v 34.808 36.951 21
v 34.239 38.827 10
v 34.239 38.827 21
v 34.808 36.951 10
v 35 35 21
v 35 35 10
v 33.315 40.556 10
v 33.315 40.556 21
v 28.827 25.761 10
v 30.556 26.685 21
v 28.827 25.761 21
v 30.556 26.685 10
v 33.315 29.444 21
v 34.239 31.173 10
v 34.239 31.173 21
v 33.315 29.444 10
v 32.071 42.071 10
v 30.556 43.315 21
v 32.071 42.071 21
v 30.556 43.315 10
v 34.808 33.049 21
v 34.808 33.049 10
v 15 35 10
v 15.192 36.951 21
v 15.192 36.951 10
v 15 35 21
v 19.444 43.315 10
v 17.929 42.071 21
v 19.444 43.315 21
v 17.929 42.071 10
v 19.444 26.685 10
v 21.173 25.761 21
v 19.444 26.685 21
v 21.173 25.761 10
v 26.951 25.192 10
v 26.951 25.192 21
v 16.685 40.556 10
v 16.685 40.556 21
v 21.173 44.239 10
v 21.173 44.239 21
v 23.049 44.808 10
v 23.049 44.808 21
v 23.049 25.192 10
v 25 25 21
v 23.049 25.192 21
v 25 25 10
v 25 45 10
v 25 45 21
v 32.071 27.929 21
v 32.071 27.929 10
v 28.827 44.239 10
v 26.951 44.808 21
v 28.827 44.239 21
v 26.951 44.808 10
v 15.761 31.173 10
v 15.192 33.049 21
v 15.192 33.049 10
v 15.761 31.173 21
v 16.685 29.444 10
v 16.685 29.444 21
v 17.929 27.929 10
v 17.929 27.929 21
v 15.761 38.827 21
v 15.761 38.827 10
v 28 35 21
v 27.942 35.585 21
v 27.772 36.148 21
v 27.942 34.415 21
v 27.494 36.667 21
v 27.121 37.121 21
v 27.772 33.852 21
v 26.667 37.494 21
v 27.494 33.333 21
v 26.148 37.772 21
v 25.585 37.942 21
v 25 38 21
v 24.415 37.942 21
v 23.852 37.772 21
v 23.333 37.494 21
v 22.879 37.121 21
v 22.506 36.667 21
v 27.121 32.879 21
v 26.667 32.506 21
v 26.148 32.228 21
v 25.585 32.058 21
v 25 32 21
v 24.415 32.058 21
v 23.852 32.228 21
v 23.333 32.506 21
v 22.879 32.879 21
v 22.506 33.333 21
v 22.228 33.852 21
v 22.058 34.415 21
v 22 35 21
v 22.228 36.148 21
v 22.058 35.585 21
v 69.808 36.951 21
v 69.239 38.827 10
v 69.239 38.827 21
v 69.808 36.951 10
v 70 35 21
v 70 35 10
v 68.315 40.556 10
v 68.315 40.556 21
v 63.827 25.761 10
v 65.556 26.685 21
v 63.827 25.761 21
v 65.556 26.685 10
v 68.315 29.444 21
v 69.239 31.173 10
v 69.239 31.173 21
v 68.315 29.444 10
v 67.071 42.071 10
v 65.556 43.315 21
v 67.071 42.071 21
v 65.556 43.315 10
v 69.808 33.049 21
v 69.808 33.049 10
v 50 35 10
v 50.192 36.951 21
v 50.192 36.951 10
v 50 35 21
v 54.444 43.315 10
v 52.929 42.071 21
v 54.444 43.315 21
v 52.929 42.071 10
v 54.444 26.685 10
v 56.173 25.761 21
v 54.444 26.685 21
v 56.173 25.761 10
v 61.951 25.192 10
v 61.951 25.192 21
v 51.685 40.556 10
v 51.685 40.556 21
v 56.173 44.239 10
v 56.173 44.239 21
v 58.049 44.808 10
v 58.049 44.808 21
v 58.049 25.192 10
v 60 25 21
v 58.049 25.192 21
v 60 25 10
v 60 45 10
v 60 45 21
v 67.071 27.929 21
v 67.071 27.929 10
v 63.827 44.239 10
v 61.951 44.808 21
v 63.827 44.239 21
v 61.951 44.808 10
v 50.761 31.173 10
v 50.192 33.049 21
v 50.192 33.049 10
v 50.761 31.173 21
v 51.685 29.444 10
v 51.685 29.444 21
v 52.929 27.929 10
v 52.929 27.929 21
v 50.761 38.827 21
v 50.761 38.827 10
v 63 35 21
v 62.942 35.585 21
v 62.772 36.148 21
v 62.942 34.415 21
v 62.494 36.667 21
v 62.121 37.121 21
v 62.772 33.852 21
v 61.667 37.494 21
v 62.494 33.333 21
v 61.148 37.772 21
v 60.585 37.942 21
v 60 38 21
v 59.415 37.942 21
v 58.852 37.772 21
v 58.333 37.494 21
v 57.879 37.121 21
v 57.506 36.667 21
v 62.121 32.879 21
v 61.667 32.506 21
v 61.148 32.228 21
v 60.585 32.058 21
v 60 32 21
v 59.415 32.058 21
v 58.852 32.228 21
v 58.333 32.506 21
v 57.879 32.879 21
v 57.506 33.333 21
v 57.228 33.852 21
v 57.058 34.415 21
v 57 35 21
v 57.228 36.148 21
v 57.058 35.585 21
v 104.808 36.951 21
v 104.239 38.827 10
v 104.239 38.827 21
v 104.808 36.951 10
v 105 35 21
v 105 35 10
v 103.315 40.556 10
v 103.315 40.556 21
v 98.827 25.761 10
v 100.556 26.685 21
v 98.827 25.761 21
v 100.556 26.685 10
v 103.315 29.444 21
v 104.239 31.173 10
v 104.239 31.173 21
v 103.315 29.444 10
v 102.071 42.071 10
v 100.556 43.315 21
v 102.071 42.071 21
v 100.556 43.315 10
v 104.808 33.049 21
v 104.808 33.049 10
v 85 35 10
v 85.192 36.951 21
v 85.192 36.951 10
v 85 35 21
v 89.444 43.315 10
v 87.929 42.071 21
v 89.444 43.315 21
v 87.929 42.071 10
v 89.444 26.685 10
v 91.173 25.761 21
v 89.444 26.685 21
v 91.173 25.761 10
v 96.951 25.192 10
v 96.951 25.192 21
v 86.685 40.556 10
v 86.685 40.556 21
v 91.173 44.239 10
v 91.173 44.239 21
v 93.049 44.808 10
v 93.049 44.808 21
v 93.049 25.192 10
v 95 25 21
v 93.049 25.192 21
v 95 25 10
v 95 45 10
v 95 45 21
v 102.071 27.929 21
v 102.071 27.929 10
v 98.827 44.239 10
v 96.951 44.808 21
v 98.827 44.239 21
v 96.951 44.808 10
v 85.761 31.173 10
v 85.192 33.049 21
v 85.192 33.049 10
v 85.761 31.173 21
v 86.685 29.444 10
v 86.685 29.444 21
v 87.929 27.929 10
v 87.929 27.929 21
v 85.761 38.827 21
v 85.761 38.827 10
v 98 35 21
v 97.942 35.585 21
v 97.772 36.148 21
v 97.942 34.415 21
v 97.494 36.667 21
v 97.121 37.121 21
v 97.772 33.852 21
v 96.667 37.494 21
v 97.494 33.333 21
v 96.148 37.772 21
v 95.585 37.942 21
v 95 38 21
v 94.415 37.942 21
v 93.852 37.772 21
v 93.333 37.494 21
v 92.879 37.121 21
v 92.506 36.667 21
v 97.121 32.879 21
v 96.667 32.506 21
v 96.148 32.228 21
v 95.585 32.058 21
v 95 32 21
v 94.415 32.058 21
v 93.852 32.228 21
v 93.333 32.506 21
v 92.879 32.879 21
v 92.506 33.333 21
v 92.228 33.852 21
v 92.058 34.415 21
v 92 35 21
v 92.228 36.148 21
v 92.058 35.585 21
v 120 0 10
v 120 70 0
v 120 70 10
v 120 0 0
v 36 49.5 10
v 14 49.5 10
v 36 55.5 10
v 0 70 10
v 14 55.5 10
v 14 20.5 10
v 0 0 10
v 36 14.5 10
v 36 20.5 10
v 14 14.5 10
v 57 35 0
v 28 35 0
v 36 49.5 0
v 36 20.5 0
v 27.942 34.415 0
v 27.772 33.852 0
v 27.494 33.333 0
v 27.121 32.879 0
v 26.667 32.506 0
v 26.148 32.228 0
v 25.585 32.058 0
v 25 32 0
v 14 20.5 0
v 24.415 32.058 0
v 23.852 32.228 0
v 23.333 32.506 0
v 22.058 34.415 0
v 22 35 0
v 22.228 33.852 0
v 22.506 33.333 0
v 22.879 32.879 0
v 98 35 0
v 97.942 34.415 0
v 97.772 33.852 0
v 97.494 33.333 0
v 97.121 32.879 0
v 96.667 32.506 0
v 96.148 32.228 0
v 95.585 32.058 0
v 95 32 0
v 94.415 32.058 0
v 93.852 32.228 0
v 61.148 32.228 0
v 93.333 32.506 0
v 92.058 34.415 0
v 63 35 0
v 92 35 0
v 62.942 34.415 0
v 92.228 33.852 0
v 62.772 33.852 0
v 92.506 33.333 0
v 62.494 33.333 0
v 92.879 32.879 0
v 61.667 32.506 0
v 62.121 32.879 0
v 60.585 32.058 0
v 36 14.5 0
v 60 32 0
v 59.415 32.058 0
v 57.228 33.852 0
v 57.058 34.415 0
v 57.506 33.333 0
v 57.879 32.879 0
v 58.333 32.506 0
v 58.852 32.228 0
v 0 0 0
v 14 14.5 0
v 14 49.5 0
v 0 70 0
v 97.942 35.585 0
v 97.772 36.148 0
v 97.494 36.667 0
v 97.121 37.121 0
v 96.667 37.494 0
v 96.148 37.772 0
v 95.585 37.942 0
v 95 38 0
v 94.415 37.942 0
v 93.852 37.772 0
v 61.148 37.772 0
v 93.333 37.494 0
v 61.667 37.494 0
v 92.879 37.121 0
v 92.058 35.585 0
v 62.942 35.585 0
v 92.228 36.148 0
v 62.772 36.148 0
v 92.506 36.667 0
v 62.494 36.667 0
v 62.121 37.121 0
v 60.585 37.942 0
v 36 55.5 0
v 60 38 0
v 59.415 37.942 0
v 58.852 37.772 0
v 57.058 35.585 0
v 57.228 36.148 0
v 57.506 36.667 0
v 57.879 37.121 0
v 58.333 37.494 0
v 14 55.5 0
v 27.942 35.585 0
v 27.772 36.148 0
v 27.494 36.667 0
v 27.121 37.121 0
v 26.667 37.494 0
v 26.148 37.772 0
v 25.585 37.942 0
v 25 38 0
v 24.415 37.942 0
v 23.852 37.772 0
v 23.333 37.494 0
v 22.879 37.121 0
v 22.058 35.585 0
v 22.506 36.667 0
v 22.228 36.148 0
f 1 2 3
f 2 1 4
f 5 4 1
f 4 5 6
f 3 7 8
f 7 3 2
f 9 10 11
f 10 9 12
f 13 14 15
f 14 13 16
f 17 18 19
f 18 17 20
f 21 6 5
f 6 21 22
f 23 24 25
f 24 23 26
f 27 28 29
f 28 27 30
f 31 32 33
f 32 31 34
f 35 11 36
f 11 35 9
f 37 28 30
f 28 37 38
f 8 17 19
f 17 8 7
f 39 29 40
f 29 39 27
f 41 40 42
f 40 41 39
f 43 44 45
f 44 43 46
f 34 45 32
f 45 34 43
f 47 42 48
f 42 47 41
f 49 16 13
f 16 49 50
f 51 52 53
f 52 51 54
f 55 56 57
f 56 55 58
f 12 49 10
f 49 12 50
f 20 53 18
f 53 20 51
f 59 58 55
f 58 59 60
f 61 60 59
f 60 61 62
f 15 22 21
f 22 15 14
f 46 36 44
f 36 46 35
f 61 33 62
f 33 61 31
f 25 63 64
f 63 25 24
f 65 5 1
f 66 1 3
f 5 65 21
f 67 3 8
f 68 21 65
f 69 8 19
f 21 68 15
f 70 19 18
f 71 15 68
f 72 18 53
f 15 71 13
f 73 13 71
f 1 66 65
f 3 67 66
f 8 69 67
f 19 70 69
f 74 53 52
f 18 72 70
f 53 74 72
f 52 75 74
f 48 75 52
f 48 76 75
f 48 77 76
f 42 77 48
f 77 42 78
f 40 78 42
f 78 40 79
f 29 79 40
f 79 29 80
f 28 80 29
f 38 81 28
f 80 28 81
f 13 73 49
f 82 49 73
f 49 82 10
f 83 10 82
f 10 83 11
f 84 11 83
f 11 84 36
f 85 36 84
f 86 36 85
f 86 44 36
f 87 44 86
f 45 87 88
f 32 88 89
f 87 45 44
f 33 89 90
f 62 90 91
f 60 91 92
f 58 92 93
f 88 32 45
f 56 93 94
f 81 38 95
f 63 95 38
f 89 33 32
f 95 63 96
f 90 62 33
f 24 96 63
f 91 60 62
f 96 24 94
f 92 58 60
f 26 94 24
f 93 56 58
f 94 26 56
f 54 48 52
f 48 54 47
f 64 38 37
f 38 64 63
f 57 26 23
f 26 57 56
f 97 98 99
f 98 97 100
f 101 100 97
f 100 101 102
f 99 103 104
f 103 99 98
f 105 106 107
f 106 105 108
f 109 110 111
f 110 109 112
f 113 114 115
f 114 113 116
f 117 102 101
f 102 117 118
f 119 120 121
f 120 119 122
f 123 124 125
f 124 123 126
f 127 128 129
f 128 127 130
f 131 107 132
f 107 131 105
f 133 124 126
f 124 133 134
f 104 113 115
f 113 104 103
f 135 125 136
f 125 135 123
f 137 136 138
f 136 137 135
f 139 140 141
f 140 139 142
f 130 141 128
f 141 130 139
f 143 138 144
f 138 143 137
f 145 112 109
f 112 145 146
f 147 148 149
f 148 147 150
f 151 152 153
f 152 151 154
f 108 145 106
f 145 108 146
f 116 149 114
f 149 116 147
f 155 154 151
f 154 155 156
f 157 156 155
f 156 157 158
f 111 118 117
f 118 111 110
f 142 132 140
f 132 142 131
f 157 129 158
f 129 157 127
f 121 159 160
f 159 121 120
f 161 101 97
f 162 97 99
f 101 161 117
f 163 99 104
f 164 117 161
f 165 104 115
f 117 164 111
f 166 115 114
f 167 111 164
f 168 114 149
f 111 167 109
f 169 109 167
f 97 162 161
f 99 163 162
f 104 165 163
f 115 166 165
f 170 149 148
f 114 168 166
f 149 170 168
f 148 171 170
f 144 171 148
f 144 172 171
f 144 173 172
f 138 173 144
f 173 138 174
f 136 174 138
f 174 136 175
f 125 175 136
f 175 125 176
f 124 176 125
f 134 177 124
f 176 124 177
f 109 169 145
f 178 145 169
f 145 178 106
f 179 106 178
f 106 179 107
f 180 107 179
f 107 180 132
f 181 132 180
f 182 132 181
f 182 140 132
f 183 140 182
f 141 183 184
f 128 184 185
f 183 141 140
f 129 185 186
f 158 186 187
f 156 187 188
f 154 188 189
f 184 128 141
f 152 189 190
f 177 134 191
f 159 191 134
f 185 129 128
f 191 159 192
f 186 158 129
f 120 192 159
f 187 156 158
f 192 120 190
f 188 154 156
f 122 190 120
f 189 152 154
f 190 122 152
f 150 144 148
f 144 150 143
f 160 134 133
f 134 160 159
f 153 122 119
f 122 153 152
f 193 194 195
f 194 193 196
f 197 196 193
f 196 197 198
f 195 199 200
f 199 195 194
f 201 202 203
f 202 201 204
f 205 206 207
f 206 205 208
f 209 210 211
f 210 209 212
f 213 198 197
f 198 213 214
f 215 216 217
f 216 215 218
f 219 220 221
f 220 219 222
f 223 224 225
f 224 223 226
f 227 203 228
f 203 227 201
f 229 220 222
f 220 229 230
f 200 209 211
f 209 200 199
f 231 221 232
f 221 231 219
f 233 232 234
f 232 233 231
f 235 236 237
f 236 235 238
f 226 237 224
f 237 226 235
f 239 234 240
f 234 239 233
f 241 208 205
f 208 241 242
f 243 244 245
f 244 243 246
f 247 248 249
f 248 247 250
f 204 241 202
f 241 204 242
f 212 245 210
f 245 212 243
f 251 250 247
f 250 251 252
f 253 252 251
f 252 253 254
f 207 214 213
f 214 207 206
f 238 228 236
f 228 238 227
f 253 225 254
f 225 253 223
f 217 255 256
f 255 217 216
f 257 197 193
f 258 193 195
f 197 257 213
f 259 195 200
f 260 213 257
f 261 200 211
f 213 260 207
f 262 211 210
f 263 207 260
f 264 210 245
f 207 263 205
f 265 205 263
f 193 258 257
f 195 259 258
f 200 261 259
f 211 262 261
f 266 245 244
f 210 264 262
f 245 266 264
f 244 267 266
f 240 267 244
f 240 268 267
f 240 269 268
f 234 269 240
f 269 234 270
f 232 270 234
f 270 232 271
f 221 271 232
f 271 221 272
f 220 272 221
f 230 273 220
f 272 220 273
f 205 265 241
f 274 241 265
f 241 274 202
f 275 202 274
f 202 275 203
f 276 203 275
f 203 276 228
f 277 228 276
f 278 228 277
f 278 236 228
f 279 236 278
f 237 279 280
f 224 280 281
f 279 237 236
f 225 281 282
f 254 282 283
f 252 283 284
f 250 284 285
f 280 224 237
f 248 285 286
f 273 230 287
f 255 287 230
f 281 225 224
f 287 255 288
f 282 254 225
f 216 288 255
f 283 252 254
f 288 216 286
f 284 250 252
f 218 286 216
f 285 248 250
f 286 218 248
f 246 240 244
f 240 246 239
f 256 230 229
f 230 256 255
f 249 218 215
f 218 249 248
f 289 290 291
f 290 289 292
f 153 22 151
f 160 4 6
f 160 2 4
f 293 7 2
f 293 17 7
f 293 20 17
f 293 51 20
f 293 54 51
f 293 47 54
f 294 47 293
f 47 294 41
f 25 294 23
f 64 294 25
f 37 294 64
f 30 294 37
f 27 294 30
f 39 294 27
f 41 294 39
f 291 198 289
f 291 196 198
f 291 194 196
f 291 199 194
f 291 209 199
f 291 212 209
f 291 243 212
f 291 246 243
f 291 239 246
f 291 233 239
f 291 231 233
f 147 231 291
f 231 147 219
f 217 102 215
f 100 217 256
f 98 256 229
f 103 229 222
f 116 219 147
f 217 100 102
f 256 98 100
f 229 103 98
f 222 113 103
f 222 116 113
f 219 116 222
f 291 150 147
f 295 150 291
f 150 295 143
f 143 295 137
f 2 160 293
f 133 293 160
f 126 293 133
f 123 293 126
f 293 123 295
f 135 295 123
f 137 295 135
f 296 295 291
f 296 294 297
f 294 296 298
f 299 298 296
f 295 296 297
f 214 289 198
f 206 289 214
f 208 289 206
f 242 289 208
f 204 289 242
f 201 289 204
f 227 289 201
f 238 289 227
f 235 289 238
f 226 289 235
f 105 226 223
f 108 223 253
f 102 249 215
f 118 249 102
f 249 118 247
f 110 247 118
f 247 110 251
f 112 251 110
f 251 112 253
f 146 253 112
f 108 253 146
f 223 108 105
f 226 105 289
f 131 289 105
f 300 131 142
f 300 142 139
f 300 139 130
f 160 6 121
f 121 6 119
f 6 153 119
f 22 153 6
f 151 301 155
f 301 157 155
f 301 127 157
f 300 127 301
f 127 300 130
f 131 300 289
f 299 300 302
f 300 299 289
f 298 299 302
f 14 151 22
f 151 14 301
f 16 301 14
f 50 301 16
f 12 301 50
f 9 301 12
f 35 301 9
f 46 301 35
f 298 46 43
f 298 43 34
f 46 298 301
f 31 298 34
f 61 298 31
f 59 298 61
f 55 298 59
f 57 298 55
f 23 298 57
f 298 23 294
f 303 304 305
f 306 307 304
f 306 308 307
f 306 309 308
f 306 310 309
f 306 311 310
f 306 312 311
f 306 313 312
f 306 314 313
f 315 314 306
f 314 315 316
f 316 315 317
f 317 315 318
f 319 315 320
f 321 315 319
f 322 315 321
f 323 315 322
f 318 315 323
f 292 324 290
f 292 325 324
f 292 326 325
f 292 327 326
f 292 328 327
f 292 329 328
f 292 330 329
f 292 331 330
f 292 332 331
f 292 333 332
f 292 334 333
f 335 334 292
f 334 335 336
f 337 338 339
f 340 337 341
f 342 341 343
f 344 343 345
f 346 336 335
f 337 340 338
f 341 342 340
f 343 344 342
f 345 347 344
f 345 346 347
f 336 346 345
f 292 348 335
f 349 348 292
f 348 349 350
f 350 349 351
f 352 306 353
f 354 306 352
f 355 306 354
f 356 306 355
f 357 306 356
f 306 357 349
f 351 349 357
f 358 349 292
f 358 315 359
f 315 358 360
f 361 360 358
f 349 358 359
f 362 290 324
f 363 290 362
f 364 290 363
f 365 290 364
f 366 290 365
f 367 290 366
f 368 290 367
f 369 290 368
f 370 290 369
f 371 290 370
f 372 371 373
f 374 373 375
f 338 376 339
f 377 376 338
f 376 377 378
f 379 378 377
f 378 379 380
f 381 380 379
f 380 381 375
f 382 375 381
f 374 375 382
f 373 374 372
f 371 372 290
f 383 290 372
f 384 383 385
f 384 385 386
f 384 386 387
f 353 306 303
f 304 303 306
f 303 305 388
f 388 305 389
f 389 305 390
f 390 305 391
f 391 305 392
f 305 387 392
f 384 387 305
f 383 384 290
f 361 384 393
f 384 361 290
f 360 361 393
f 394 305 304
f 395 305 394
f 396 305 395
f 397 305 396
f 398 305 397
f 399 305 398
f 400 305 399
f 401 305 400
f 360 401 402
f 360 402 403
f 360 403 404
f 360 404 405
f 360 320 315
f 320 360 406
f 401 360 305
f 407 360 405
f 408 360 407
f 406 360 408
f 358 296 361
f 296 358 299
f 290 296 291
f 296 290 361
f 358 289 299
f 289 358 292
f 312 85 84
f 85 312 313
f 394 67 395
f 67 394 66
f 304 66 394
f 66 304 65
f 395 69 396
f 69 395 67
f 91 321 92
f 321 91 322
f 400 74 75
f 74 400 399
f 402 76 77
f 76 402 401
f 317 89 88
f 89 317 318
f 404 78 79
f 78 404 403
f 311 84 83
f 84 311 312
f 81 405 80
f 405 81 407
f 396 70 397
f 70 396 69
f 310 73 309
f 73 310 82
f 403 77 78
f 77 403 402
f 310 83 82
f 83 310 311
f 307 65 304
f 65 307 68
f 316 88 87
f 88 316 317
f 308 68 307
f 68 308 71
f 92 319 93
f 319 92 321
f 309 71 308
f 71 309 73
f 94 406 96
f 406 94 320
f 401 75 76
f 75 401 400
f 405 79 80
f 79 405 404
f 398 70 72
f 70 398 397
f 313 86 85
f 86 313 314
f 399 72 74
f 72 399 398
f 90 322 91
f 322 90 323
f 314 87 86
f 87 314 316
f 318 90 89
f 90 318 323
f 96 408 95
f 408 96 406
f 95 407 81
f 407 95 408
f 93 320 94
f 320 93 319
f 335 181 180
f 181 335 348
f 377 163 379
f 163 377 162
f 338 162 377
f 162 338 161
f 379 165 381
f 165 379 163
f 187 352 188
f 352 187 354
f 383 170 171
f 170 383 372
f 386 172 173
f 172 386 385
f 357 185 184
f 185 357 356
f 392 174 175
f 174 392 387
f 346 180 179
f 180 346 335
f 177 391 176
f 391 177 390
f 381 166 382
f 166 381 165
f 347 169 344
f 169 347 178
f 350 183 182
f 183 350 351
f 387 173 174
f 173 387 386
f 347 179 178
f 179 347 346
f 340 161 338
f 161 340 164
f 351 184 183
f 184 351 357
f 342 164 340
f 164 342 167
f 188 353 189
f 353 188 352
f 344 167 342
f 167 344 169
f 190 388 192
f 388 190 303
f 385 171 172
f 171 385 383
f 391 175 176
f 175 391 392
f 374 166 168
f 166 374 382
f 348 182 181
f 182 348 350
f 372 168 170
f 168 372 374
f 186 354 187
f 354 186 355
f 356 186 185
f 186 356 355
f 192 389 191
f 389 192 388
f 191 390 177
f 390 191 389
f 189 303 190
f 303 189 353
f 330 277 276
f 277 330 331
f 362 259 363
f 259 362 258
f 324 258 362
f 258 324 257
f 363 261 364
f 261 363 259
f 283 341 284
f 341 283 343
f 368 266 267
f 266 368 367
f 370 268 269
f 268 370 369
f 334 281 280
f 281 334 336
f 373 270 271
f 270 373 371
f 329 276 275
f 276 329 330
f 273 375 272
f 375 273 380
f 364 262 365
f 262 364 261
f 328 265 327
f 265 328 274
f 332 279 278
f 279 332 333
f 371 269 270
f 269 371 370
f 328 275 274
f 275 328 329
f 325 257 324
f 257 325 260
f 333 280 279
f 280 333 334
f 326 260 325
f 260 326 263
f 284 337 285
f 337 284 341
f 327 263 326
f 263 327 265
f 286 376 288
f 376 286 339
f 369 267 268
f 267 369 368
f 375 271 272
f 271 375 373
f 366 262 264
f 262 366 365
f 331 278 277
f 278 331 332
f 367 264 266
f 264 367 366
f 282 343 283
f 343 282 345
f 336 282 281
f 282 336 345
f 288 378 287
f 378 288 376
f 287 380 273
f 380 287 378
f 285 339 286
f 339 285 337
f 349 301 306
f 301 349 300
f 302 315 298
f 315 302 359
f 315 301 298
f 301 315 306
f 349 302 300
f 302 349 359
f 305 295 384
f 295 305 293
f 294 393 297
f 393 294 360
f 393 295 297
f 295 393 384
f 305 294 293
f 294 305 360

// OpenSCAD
$fn = 32;

// ----------------------------------------------------------------------
// Drill jig: three_boss_slot jig
// ----------------------------------------------------------------------

// --- parameters (mm) ---
plate_l = 120;            // plate length, X
plate_w = 70;             // plate width, Y
plate_t = 10;             // plate thickness
boss_d = 20;              // guide boss diameter
boss_h = 12;              // boss height above the plate
guide_d = 6;              // guide hole diameter
boss_pitch = 35;          // boss pitch
slot_w = 6;               // clamp slot width
slot_l = 22;              // clamp slot length
slot_x = 14;              // slot start X

n_boss = 3;  // guide bosses
boss_x0 = (plate_l - (n_boss - 1) * boss_pitch) / 2;  // first boss X
boss_top = plate_t - 1 + boss_h;  // boss crown height
total_h = boss_top;  // overall height

difference() {
  union() {
  cube([plate_l, plate_w, plate_t]);
  for (i = [0 : n_boss - 1])
    translate([boss_x0 + i * boss_pitch, plate_w / 2, plate_t - 1])
      cylinder(h = boss_h, d = boss_d);
  }
  for (i = [0 : n_boss - 1])
    translate([boss_x0 + i * boss_pitch, plate_w / 2, -1])
      cylinder(h = plate_t + boss_h, d = guide_d);
  for (cy = [plate_w * 0.25, plate_w * 0.75])
    translate([slot_x, cy - slot_w / 2, -1])
      cube([slot_l, slot_w, plate_t + 2]);
}
